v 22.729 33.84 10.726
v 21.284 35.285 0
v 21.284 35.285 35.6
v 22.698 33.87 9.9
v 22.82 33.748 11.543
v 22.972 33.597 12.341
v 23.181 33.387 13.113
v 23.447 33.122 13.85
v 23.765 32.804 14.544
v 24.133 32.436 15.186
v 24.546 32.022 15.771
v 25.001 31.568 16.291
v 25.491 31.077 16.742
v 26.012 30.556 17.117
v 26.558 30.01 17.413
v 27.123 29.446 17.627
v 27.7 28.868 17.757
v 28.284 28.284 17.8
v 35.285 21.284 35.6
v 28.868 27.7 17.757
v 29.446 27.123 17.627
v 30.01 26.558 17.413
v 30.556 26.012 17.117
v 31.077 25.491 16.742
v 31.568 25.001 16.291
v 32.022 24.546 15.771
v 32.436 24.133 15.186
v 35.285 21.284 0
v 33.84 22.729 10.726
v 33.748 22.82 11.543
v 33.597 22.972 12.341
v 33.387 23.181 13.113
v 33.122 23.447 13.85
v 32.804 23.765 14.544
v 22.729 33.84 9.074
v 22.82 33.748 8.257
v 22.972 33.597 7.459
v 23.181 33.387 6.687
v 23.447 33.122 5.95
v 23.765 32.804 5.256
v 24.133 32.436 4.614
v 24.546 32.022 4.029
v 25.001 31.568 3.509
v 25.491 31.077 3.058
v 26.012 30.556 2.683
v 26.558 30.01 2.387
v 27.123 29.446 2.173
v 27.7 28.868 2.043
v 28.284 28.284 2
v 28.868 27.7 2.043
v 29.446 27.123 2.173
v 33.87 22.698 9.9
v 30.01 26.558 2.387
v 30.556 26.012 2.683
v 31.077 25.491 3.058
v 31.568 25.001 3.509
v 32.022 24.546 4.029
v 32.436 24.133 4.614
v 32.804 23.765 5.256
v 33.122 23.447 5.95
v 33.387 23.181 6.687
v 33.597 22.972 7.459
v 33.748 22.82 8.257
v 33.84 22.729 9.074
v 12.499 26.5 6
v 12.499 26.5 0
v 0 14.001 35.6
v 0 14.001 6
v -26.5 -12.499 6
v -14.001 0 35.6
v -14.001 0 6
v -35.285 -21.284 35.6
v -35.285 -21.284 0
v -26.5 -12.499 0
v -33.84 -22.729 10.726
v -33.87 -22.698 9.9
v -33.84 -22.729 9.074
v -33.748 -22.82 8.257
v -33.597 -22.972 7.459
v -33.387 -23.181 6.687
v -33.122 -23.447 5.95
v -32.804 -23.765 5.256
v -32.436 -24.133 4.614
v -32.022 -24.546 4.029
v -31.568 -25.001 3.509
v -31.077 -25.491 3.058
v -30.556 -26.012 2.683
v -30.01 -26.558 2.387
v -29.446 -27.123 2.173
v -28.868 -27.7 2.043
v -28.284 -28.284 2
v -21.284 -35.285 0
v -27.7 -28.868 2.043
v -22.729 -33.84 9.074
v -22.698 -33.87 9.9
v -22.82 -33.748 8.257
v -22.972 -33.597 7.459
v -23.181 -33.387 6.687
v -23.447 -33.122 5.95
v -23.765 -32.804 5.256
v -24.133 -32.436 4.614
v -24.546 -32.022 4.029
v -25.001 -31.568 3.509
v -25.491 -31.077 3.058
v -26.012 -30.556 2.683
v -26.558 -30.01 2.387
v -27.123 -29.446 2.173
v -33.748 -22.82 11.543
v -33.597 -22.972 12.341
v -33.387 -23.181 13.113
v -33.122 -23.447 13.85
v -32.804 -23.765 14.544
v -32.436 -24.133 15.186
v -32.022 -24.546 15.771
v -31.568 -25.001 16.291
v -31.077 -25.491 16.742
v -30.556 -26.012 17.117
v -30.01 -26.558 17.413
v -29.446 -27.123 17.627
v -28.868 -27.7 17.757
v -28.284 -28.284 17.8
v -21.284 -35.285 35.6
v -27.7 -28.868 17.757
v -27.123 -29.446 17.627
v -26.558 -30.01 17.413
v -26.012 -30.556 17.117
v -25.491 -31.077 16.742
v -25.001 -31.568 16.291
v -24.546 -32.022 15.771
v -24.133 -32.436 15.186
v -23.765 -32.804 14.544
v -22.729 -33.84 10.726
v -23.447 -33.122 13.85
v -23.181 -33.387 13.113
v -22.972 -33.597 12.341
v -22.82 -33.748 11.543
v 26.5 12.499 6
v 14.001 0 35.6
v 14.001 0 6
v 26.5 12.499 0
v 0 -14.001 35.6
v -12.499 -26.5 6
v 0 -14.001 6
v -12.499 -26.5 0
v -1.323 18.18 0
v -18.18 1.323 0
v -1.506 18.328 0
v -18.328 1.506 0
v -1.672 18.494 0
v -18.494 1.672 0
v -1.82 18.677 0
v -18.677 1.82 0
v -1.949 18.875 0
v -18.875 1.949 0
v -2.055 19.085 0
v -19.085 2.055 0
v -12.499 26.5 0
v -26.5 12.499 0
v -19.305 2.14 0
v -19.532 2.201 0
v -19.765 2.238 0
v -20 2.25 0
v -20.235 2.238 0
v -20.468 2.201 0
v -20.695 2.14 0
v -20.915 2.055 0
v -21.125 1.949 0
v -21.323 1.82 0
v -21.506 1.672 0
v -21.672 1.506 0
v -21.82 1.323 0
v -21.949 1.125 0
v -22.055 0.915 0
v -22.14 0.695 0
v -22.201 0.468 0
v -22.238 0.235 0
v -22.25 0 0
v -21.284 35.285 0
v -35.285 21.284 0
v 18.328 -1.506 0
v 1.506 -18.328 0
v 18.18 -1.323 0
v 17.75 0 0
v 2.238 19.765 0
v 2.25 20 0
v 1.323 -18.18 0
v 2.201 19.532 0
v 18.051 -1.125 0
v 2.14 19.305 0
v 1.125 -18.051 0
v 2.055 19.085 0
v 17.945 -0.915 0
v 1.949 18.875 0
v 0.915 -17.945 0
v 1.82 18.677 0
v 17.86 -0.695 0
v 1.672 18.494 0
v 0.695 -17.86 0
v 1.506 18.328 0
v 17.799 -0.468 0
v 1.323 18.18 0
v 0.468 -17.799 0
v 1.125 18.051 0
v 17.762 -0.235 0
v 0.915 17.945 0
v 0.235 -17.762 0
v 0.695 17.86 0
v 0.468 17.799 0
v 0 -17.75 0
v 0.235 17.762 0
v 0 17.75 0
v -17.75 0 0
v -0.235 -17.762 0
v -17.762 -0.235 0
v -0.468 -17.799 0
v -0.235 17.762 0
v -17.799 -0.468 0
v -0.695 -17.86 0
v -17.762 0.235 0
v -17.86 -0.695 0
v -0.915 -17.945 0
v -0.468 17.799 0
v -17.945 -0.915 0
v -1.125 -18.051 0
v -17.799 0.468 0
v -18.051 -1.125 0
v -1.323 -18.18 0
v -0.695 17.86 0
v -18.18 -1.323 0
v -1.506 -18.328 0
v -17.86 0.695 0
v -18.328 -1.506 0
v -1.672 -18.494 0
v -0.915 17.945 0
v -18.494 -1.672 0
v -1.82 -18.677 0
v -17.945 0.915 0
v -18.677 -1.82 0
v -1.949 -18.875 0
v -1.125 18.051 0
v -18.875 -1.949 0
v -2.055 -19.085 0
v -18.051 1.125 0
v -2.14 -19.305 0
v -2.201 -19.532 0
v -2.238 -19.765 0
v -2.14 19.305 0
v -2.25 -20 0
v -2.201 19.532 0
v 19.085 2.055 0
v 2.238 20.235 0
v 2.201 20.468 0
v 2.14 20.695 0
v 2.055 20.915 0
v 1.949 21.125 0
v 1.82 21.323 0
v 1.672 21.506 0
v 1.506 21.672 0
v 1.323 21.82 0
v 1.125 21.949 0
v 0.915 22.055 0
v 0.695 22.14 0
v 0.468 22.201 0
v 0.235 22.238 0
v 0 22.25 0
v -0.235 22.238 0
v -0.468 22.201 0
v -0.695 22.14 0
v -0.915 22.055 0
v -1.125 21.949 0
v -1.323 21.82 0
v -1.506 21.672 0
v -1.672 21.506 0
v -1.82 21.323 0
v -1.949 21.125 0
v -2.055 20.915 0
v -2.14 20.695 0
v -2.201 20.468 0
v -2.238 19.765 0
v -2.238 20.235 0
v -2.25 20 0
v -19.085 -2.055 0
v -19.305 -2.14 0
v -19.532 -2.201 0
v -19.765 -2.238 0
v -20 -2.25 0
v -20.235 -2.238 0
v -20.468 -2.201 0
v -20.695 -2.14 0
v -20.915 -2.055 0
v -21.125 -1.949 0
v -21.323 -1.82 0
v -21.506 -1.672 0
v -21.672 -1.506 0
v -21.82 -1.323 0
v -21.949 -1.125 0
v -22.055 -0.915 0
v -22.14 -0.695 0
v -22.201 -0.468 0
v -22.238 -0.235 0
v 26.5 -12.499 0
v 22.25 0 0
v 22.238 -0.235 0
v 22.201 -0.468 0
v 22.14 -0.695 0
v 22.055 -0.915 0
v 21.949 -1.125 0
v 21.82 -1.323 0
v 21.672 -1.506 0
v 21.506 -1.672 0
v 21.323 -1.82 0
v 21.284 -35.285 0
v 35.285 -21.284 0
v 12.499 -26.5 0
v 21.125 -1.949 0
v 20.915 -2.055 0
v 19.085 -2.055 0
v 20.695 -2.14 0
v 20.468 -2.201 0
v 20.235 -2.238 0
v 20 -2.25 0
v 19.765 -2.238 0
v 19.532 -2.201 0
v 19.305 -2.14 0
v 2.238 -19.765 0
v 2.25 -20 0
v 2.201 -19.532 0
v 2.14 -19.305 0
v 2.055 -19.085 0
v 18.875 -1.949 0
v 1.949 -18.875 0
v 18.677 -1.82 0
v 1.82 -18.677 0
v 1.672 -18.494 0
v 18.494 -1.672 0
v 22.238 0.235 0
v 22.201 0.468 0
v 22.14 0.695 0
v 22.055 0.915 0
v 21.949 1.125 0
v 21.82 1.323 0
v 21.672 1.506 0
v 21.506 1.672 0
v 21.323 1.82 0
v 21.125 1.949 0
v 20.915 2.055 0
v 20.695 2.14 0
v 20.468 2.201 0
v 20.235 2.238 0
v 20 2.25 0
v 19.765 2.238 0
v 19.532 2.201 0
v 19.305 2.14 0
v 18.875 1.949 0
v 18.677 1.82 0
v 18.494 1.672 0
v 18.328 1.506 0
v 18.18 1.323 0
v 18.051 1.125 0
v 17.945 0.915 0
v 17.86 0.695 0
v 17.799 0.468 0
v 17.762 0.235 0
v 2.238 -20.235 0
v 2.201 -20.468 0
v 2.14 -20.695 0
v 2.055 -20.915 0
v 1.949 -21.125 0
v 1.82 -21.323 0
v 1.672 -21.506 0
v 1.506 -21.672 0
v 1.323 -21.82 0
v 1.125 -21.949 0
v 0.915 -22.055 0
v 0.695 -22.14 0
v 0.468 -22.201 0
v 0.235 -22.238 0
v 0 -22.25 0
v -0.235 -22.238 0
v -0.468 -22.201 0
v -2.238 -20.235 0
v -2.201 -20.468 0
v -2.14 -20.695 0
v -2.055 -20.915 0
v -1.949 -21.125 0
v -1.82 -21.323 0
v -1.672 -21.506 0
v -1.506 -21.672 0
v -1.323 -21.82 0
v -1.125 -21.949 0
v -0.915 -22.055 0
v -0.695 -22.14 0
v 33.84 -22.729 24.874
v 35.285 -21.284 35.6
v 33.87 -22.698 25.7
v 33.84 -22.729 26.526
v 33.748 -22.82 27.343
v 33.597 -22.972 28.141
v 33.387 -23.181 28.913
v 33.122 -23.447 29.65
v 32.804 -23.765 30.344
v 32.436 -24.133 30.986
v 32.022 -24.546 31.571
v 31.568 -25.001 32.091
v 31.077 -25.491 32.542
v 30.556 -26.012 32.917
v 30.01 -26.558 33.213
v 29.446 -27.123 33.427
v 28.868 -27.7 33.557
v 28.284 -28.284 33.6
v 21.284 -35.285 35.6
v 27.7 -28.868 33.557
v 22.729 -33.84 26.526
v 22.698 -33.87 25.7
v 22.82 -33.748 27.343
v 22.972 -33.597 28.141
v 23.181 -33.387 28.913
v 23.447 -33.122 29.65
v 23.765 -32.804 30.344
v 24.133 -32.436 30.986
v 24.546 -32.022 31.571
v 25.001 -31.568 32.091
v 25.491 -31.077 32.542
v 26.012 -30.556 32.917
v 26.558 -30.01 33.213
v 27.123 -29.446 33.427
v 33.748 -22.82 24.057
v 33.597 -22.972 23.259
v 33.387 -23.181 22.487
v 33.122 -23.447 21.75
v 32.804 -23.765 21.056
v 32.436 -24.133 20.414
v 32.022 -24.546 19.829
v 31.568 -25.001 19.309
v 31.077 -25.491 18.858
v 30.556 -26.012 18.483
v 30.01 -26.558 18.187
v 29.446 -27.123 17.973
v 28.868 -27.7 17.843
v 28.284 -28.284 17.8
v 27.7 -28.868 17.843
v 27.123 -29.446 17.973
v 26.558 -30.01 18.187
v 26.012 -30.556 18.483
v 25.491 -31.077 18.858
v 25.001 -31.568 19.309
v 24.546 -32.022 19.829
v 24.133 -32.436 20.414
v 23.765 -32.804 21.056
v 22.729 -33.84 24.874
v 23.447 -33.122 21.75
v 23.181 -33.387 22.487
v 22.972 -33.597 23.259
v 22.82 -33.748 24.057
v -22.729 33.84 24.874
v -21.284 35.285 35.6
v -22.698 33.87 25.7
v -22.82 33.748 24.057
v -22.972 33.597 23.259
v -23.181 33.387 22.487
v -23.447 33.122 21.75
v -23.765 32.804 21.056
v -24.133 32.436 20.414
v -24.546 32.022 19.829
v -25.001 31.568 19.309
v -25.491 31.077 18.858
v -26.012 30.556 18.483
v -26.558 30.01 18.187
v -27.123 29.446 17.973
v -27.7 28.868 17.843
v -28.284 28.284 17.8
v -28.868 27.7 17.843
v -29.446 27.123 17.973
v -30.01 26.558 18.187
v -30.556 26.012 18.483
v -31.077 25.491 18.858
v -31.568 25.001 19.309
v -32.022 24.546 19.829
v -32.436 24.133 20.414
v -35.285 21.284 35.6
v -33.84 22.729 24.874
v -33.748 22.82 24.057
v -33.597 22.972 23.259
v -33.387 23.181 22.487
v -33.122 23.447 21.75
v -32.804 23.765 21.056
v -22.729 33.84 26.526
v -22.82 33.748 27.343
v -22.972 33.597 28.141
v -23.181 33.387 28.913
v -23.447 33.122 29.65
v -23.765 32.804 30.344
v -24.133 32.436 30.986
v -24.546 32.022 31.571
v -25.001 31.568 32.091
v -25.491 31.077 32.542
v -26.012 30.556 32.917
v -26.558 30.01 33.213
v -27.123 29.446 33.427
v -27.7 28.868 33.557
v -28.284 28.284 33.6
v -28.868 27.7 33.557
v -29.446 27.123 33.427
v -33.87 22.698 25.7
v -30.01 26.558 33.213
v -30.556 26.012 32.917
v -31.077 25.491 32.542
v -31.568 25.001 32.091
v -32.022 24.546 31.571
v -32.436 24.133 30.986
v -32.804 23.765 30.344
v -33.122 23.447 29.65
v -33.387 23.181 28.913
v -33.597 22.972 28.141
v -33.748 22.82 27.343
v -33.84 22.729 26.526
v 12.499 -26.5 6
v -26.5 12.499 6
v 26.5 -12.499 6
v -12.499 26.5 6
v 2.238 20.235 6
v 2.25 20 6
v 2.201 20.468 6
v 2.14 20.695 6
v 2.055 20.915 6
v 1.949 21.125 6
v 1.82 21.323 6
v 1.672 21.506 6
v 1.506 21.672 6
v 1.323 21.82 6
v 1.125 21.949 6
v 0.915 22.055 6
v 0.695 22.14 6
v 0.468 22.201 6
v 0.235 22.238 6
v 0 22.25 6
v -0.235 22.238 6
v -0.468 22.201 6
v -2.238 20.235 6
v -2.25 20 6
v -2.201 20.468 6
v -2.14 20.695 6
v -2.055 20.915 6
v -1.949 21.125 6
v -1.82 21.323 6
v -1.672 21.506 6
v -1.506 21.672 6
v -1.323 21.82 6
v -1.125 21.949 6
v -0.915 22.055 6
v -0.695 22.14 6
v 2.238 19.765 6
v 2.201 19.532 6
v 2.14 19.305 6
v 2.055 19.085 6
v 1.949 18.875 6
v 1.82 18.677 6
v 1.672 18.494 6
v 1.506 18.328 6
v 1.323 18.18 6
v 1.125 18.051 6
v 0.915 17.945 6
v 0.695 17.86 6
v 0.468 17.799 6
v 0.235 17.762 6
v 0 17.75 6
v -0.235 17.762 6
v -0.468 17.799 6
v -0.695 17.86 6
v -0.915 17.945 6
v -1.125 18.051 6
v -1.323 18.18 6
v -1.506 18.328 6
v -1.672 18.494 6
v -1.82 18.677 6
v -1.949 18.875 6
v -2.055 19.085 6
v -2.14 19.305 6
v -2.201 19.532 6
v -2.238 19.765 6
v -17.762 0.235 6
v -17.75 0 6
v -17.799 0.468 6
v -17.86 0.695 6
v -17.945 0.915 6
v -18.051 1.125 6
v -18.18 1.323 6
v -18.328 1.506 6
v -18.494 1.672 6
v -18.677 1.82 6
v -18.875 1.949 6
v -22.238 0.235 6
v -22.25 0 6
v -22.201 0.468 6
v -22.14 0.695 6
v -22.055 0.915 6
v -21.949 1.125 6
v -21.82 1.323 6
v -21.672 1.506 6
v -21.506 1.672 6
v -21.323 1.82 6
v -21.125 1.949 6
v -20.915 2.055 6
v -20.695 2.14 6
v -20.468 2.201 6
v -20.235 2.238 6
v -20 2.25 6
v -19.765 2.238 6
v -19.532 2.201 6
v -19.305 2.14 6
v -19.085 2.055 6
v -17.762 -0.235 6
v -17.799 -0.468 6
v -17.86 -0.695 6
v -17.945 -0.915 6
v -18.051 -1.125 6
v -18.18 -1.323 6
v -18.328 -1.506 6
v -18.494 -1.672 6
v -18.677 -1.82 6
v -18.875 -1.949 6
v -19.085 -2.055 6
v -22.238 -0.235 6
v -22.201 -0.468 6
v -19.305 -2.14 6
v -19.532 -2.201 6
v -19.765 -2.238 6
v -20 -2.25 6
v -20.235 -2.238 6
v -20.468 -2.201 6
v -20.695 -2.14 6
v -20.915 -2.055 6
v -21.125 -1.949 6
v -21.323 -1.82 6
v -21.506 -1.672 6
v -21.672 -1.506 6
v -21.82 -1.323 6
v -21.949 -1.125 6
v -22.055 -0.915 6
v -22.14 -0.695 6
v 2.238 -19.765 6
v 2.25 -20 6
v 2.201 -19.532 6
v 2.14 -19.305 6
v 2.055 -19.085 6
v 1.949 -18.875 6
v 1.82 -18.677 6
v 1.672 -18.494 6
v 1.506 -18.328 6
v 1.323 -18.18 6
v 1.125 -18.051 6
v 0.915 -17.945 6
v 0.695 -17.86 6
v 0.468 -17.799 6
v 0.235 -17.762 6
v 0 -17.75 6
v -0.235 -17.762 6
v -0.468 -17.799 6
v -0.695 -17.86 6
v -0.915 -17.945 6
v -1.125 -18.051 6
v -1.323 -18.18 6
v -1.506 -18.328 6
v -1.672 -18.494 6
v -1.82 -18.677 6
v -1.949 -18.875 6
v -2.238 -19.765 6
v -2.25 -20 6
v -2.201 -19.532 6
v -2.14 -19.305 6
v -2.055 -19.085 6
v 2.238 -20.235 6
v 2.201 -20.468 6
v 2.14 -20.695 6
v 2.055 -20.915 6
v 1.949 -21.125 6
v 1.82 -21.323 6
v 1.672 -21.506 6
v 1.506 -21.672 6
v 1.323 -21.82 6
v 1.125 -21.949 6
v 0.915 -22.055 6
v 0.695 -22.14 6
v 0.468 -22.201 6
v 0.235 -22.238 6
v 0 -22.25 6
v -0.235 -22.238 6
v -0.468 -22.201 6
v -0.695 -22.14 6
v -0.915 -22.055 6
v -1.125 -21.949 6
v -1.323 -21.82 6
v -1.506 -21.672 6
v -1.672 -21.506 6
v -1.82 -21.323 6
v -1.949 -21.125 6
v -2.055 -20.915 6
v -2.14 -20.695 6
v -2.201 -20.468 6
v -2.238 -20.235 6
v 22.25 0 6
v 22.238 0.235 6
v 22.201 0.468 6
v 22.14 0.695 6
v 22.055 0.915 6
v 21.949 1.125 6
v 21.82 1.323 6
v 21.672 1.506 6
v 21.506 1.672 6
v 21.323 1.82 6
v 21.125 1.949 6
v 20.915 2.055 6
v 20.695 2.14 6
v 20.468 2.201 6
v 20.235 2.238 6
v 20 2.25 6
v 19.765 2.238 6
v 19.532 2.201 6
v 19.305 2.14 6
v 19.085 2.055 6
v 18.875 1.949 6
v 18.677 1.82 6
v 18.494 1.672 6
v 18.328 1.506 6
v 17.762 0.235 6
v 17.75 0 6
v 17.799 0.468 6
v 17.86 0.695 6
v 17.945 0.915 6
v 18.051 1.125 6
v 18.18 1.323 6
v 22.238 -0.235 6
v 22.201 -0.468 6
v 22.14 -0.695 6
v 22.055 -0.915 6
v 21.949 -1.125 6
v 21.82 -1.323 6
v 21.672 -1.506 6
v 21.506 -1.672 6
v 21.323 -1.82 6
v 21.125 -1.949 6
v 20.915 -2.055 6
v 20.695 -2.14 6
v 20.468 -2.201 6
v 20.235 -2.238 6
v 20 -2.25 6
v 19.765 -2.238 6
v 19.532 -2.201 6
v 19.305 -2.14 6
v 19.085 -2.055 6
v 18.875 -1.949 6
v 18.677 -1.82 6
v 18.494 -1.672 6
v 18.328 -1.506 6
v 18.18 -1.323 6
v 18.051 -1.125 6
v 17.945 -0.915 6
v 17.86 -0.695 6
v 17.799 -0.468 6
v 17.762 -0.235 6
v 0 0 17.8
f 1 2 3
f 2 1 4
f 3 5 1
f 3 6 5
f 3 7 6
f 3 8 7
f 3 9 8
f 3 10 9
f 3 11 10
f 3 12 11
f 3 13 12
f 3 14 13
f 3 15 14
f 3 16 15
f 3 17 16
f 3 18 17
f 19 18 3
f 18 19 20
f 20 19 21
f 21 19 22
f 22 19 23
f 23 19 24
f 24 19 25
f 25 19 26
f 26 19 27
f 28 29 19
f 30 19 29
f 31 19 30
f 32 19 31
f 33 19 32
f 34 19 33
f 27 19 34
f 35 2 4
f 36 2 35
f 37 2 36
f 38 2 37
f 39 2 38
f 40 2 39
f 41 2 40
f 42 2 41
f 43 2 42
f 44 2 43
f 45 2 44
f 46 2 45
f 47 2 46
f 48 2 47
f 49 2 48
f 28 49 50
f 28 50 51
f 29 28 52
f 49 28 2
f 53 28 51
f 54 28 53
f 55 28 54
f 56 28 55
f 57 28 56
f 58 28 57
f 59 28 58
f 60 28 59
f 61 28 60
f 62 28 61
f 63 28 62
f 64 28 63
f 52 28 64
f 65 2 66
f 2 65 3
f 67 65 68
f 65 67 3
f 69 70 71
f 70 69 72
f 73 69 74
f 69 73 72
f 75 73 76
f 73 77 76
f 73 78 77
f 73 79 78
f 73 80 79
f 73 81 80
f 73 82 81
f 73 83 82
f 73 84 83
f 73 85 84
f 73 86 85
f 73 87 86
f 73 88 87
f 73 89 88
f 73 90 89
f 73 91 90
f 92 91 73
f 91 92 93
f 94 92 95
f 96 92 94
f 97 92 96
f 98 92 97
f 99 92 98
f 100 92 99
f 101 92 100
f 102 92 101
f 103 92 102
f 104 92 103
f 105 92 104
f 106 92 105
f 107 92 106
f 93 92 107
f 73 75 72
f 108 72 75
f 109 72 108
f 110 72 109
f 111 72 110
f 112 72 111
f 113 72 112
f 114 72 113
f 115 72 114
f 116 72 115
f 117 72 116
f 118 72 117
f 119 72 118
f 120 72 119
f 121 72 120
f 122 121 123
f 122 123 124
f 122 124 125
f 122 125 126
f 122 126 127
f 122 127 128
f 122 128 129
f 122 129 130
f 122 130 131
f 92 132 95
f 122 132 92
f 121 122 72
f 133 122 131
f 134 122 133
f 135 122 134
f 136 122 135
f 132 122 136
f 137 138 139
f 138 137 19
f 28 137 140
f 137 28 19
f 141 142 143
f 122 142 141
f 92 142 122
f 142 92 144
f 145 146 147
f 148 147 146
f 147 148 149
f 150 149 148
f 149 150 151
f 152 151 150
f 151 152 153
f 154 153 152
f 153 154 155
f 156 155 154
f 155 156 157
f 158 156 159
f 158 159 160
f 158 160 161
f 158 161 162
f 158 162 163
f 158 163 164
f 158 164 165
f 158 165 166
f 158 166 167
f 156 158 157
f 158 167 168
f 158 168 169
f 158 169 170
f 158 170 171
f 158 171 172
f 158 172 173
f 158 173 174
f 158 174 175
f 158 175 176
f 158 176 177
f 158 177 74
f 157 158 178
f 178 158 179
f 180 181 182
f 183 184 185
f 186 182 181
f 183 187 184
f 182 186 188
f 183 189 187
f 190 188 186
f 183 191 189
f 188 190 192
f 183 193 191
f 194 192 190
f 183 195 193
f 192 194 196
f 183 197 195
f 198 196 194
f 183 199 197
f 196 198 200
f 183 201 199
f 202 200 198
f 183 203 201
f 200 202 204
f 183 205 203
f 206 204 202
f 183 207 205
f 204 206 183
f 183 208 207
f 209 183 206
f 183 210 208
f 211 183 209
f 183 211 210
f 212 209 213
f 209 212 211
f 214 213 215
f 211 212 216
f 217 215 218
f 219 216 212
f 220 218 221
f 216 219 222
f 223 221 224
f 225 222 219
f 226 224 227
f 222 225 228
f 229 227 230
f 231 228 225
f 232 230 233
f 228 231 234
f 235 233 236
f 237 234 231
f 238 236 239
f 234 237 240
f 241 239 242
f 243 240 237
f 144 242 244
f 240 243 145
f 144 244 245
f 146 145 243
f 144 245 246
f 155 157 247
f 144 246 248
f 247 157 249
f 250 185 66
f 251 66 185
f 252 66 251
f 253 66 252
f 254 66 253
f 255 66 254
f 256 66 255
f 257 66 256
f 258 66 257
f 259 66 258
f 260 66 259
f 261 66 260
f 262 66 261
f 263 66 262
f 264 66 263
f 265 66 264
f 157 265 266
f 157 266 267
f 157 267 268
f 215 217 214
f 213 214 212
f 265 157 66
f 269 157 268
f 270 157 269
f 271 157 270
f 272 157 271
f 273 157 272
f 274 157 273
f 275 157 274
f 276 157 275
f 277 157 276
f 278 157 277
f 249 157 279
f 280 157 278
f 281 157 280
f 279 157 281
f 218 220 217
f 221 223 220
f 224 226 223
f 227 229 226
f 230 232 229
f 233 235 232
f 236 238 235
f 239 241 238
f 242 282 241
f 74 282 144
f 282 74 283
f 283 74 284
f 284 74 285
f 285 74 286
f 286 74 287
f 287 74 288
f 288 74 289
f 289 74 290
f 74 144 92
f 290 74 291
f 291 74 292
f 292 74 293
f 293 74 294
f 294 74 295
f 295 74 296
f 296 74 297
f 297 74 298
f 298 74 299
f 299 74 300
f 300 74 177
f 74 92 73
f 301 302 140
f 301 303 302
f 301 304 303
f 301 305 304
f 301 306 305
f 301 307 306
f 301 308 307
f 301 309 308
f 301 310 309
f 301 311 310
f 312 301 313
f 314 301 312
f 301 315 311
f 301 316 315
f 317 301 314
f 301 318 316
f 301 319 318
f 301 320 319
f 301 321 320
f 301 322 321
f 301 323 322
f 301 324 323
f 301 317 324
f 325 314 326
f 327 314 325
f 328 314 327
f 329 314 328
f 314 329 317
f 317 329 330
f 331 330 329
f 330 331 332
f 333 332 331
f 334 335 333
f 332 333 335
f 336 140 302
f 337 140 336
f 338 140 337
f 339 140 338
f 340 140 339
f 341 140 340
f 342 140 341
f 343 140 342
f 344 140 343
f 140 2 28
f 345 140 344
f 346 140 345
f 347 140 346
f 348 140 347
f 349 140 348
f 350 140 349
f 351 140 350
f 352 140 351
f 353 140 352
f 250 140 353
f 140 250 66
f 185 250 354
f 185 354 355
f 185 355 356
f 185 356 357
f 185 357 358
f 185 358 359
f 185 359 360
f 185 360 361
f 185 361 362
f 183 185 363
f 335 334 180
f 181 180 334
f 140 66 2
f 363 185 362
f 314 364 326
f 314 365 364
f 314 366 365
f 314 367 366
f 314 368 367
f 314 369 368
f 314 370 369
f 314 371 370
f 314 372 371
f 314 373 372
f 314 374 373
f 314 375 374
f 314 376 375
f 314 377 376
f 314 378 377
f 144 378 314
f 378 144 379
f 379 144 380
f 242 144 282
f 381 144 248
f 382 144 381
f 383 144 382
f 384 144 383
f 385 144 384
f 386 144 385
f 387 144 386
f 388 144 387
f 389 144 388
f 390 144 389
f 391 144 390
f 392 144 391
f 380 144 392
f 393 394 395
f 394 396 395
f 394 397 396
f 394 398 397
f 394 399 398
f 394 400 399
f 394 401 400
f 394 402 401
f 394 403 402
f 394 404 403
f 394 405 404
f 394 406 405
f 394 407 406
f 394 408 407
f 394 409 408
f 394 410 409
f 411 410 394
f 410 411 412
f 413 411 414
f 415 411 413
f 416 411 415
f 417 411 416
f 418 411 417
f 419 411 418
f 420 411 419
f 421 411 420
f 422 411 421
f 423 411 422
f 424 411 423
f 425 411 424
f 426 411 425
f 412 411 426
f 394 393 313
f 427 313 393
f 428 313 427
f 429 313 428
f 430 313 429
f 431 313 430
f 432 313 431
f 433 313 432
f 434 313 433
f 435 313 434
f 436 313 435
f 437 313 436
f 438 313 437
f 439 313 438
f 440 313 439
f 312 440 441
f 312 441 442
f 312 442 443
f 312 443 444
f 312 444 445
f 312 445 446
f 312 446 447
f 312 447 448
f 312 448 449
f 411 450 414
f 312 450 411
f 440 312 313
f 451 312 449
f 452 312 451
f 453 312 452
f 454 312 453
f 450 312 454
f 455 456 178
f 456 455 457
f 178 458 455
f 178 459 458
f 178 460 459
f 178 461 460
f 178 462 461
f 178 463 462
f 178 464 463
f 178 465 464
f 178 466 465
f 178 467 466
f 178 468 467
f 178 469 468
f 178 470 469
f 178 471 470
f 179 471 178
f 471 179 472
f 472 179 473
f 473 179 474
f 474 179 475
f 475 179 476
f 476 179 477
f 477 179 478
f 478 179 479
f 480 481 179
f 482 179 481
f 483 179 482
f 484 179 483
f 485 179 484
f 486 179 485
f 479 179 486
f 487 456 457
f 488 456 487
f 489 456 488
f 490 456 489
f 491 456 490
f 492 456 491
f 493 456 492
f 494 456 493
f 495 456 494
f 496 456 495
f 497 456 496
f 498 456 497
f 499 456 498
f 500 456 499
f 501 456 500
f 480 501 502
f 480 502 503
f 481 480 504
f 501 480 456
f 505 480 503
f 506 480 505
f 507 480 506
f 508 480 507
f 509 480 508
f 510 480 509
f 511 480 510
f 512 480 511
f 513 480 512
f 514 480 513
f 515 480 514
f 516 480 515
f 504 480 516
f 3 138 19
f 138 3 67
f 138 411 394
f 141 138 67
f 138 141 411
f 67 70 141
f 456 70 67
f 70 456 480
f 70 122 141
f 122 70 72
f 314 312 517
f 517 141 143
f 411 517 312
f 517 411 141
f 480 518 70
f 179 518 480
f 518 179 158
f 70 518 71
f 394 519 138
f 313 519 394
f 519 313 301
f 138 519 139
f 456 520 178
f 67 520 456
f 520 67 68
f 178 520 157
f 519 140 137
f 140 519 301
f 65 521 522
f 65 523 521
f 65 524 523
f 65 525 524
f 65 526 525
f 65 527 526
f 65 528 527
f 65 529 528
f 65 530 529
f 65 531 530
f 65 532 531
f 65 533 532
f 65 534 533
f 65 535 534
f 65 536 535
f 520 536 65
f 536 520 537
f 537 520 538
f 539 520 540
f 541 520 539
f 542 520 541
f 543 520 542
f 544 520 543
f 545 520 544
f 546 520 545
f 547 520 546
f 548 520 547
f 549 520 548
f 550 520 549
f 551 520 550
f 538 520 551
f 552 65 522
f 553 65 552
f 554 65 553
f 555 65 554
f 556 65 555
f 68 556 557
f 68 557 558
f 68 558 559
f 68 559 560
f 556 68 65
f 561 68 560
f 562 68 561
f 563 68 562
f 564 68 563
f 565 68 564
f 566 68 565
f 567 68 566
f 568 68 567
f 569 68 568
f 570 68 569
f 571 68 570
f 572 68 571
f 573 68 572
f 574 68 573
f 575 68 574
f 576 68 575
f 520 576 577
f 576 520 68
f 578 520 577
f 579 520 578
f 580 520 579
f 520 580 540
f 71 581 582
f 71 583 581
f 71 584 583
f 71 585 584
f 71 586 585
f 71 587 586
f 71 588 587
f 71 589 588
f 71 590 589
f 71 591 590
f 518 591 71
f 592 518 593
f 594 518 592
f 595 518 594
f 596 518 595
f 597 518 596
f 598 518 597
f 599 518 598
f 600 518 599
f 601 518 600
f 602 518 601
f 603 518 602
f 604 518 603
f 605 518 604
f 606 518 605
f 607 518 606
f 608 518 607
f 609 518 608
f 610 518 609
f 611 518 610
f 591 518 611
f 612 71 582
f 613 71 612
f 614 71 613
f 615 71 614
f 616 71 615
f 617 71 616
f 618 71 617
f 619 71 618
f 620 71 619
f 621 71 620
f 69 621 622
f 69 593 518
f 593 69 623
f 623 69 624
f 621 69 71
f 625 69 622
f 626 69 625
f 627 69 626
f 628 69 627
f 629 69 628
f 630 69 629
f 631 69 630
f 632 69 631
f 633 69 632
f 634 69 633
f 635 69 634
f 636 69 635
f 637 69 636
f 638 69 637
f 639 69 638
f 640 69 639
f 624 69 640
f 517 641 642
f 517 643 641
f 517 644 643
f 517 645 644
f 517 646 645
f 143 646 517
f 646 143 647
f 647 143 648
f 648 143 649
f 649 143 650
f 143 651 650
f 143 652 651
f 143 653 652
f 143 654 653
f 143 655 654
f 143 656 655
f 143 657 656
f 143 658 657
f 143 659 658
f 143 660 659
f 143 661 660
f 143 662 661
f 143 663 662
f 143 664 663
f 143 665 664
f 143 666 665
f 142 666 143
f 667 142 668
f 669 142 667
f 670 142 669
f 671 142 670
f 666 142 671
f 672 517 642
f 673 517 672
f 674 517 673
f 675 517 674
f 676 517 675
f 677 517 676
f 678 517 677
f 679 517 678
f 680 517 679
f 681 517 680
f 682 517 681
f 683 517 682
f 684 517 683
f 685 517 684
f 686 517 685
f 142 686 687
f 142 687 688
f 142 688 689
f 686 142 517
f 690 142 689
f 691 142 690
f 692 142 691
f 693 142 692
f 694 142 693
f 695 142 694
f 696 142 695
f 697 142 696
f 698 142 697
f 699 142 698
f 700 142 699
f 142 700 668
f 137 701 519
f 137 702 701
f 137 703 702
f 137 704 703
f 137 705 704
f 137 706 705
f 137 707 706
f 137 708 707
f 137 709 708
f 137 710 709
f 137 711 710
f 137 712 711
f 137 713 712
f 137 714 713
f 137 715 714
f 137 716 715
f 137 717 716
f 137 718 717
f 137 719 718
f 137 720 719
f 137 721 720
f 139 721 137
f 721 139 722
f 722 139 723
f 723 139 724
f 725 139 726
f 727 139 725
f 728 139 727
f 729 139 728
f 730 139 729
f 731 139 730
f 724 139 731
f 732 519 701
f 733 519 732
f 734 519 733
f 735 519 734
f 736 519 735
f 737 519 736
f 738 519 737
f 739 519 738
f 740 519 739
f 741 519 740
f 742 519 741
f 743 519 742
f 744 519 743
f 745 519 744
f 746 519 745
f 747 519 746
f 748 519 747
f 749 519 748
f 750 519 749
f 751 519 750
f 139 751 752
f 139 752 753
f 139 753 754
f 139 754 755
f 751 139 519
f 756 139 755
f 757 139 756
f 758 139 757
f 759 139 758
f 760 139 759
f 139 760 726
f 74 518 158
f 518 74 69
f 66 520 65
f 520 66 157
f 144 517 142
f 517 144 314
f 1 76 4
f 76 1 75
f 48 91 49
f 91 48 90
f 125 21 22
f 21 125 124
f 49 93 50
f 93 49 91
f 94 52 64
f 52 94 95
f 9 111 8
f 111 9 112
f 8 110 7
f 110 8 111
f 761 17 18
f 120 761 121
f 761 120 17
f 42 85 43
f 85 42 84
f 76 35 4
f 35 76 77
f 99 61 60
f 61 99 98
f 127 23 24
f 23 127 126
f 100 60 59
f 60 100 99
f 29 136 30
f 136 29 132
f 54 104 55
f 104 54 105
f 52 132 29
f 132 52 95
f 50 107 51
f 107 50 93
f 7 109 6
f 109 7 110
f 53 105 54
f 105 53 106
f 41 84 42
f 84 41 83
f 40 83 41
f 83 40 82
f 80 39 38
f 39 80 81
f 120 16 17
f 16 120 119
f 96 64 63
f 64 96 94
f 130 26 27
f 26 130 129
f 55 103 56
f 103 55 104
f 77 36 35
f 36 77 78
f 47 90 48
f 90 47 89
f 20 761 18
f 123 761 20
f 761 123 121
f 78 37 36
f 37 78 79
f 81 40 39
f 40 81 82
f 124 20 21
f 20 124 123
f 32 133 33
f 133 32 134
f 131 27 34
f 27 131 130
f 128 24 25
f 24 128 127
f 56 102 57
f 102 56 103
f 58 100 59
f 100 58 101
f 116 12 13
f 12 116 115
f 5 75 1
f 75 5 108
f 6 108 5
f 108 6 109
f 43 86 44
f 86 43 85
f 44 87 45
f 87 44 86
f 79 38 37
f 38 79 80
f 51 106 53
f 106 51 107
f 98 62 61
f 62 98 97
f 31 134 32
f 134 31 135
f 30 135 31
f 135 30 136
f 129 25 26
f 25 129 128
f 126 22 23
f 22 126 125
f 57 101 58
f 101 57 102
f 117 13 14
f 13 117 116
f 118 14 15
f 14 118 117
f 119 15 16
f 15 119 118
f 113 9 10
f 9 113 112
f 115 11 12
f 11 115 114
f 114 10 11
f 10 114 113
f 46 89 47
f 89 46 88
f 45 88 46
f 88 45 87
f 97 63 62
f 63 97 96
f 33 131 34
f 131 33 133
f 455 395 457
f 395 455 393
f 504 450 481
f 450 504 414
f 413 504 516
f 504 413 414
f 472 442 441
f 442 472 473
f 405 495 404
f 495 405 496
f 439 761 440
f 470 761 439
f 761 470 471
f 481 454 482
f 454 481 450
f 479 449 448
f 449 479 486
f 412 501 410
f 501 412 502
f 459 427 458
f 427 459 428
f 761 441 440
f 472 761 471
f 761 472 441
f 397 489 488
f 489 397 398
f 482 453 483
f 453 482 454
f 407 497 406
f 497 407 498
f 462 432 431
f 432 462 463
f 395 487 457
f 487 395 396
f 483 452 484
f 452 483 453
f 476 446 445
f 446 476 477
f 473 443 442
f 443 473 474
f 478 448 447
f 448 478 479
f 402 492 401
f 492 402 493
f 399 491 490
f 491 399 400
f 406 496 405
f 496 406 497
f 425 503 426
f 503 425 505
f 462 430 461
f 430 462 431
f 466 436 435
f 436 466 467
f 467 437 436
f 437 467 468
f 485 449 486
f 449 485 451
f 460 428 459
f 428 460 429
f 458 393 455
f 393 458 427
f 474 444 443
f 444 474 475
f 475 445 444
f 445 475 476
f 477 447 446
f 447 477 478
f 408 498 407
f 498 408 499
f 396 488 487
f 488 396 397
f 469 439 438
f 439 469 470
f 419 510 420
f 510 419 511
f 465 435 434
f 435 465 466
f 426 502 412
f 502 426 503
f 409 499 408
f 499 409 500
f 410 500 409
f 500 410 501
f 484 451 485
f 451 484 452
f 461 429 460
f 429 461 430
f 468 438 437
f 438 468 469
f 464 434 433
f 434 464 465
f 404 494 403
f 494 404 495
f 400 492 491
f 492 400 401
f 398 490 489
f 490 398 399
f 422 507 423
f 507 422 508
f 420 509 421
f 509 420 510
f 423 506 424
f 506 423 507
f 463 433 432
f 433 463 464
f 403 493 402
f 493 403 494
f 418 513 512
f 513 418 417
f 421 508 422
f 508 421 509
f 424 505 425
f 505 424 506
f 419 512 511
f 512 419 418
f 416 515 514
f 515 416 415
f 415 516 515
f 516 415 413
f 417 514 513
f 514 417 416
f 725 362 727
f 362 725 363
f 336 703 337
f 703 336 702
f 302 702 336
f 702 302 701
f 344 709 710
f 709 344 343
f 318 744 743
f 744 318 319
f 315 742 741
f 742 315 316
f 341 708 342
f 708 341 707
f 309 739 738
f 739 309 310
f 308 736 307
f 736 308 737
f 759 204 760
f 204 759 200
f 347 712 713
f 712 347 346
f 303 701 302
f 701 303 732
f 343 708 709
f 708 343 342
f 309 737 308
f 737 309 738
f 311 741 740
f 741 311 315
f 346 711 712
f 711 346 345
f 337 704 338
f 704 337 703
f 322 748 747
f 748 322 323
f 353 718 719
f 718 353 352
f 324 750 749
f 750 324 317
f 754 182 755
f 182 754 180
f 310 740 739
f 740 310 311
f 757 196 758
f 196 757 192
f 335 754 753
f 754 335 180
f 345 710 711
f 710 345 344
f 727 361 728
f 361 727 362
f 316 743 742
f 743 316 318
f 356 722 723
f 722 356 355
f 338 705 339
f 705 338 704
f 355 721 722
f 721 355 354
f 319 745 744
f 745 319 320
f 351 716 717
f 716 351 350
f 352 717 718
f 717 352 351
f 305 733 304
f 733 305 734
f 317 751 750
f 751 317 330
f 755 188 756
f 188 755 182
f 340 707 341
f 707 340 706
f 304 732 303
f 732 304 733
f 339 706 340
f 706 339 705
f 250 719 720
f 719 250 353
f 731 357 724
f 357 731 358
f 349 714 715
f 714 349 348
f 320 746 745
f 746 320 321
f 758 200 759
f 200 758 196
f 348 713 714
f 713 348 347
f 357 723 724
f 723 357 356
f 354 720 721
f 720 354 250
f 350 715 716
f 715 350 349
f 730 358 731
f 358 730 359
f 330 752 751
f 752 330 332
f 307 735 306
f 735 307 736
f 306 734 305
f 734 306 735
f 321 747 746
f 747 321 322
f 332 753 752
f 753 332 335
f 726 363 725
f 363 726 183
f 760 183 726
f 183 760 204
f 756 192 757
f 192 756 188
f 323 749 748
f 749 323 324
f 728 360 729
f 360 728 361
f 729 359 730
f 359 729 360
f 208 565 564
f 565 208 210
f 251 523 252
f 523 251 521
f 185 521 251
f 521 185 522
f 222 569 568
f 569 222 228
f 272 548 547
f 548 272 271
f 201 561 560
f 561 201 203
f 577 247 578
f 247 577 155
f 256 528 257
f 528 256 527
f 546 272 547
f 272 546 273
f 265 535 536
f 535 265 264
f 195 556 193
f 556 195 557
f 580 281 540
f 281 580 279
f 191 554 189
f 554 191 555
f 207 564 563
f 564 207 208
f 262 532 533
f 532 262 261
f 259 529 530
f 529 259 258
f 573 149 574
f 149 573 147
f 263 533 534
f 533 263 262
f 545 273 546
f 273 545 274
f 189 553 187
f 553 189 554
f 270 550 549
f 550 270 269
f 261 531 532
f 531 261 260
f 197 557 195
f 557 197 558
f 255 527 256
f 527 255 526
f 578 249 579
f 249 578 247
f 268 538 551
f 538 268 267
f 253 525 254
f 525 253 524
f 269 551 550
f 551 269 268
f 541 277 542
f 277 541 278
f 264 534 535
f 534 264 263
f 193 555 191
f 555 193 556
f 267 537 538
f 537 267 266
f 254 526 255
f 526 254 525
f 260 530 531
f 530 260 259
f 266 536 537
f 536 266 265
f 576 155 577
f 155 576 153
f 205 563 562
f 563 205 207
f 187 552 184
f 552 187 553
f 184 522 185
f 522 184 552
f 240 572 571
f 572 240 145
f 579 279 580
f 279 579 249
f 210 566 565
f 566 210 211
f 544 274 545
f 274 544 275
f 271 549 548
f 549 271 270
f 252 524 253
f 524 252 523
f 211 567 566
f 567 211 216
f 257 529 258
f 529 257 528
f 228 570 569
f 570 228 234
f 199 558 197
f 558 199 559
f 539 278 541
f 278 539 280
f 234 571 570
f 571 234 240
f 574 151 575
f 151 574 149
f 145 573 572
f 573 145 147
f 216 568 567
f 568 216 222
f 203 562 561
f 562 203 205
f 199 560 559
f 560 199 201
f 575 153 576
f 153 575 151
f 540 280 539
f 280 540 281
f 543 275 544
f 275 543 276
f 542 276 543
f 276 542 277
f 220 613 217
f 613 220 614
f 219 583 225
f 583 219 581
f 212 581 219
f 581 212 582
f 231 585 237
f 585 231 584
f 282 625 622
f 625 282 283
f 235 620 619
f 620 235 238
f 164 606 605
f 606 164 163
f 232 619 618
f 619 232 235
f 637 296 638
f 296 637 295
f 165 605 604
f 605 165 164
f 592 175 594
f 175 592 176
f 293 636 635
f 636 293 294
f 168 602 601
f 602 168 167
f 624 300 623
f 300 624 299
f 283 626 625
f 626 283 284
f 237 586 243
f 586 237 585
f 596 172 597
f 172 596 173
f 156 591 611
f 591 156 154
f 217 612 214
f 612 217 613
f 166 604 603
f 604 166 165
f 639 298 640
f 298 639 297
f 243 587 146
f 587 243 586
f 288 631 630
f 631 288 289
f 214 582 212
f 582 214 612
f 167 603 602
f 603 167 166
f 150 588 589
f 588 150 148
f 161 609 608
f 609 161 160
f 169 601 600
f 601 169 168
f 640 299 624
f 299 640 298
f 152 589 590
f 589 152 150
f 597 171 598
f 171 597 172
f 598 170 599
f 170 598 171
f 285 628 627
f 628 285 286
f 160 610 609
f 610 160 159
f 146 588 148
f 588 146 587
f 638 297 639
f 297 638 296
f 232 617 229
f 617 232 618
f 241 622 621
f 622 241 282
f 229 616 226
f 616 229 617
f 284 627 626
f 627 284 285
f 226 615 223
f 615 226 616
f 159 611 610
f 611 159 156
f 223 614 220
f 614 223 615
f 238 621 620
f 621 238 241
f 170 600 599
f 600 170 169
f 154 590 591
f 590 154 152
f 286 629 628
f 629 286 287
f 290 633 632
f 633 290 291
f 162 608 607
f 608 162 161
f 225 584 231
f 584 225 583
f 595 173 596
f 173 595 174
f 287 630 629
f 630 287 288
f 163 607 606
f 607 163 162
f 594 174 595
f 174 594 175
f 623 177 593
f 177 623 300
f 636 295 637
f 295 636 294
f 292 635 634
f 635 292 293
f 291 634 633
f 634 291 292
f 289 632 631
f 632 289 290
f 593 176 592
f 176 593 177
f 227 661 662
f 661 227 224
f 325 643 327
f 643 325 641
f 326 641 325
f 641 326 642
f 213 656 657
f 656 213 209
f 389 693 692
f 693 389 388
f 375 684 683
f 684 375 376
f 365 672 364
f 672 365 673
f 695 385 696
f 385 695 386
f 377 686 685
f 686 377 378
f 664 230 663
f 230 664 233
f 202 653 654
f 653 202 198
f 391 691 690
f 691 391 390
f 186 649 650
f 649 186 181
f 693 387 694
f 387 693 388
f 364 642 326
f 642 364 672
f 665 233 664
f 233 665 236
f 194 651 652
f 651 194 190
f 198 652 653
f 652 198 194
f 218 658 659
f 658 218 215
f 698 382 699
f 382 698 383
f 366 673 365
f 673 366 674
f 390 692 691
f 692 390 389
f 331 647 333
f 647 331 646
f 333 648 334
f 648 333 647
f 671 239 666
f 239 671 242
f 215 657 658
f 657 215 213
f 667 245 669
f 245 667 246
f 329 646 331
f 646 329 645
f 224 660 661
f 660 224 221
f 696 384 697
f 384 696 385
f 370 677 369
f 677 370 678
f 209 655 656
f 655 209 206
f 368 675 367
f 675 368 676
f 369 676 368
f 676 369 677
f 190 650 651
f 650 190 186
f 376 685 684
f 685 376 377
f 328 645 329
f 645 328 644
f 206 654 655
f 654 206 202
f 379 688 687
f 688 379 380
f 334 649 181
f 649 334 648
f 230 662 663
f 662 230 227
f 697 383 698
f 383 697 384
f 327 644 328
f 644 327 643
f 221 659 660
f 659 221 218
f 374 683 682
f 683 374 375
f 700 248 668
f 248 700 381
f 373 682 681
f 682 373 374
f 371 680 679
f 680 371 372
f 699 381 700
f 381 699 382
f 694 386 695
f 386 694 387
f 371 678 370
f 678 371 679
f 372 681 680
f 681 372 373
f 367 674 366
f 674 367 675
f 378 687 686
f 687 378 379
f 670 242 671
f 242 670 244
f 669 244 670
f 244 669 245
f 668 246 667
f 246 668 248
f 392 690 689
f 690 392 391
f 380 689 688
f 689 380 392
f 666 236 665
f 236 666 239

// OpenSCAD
// Center cross for a drone frame

//print with 100% infill

//=======================================================================
// Config
//=======================================================================
//beam diameter
dia1=15.8;

//wall thickness main cross beam
wall=2; 

//socket depth for both axis
socket1=40;

//plate thickness
plate_h = 6;

//strap holder
strap_l=0; //set to 0 to not use straps
strap_w=3;
strap_edge = 4;

//=======================================================================

$fn=60; //number of fragments

tol=0.01;


plate_w = 53;

difference() {

  union() {
    rotate([0,0,45]) Tube_add(2*socket1,dia1/2,2);
    translate([0,0,dia1]) rotate([0,0,-45]) Tube_add(2*socket1,dia1/2,wall);
    
    translate([0,0,dia1]) rotate([0,0,45]) Tube_add(2*socket1,dia1/2,2);
    rotate([0,0,-45]) Tube_add(2*socket1,dia1/2,wall);
    
    //plate
    translate([-plate_w/2,-plate_w/2,0]) cube([plate_w,plate_w,plate_h]);
  }
  rotate([0,0,45]) Tube_drill(2*socket1,dia1/2,2);
  translate([0,0,dia1]) rotate([0,0,-45]) Tube_drill(2*socket1,dia1/2,wall);
  
  //strap holes
  if(strap_l) {
    strap_offset = plate_w/2-strap_edge-strap_w/2;
    Strap_drill(strap_offset);
    Strap_drill(-strap_offset);
  }
  
  //motor M4xdia40 holes
  translate([20,0,0]) cylinder(h=1000,r=2.25,center=true);
  translate([0,20,0]) cylinder(h=1000,r=2.25,center=true);
  translate([-20,0,0]) cylinder(h=1000,r=2.25,center=true);
  translate([0,-20,0]) cylinder(h=1000,r=2.25,center=true);
  
  //keep bottom half only
  //translate([-150,-150,dia1/2+wall]) cube([300,300,50]);
}







//Tube along x-axis in positive z
module Tube_add(h, r, wall) {
  translate([-h/2,0,r+wall]) rotate([0,90,0]) 
    //cylinder(h=h, r=r+wall);
    translate([-r-wall,-r-wall,0]) cube([2*(r+wall),2*(r+wall),h]);
}
module Tube_drill(h, r, wall) {
  translate([-500,0,r+wall]) rotate([0,90,0]) 
    cylinder(h=1000, r=r);
}
  
module Strap_drill(offset) {
  translate([0,offset,0]) union() {
    cube([strap_l,strap_w,1000],center=true);
    translate([-strap_l/2,0,0]) cylinder(h=1000,r=strap_w/2,center=true);
    translate([+strap_l/2,0,0]) cylinder(h=1000,r=strap_w/2,center=true);
    //translate([0,0,500+strap_edge]) cube([strap_l+2*strap_edge,strap_w+2*strap_edge+tol,1000],center=true);
  }
}
